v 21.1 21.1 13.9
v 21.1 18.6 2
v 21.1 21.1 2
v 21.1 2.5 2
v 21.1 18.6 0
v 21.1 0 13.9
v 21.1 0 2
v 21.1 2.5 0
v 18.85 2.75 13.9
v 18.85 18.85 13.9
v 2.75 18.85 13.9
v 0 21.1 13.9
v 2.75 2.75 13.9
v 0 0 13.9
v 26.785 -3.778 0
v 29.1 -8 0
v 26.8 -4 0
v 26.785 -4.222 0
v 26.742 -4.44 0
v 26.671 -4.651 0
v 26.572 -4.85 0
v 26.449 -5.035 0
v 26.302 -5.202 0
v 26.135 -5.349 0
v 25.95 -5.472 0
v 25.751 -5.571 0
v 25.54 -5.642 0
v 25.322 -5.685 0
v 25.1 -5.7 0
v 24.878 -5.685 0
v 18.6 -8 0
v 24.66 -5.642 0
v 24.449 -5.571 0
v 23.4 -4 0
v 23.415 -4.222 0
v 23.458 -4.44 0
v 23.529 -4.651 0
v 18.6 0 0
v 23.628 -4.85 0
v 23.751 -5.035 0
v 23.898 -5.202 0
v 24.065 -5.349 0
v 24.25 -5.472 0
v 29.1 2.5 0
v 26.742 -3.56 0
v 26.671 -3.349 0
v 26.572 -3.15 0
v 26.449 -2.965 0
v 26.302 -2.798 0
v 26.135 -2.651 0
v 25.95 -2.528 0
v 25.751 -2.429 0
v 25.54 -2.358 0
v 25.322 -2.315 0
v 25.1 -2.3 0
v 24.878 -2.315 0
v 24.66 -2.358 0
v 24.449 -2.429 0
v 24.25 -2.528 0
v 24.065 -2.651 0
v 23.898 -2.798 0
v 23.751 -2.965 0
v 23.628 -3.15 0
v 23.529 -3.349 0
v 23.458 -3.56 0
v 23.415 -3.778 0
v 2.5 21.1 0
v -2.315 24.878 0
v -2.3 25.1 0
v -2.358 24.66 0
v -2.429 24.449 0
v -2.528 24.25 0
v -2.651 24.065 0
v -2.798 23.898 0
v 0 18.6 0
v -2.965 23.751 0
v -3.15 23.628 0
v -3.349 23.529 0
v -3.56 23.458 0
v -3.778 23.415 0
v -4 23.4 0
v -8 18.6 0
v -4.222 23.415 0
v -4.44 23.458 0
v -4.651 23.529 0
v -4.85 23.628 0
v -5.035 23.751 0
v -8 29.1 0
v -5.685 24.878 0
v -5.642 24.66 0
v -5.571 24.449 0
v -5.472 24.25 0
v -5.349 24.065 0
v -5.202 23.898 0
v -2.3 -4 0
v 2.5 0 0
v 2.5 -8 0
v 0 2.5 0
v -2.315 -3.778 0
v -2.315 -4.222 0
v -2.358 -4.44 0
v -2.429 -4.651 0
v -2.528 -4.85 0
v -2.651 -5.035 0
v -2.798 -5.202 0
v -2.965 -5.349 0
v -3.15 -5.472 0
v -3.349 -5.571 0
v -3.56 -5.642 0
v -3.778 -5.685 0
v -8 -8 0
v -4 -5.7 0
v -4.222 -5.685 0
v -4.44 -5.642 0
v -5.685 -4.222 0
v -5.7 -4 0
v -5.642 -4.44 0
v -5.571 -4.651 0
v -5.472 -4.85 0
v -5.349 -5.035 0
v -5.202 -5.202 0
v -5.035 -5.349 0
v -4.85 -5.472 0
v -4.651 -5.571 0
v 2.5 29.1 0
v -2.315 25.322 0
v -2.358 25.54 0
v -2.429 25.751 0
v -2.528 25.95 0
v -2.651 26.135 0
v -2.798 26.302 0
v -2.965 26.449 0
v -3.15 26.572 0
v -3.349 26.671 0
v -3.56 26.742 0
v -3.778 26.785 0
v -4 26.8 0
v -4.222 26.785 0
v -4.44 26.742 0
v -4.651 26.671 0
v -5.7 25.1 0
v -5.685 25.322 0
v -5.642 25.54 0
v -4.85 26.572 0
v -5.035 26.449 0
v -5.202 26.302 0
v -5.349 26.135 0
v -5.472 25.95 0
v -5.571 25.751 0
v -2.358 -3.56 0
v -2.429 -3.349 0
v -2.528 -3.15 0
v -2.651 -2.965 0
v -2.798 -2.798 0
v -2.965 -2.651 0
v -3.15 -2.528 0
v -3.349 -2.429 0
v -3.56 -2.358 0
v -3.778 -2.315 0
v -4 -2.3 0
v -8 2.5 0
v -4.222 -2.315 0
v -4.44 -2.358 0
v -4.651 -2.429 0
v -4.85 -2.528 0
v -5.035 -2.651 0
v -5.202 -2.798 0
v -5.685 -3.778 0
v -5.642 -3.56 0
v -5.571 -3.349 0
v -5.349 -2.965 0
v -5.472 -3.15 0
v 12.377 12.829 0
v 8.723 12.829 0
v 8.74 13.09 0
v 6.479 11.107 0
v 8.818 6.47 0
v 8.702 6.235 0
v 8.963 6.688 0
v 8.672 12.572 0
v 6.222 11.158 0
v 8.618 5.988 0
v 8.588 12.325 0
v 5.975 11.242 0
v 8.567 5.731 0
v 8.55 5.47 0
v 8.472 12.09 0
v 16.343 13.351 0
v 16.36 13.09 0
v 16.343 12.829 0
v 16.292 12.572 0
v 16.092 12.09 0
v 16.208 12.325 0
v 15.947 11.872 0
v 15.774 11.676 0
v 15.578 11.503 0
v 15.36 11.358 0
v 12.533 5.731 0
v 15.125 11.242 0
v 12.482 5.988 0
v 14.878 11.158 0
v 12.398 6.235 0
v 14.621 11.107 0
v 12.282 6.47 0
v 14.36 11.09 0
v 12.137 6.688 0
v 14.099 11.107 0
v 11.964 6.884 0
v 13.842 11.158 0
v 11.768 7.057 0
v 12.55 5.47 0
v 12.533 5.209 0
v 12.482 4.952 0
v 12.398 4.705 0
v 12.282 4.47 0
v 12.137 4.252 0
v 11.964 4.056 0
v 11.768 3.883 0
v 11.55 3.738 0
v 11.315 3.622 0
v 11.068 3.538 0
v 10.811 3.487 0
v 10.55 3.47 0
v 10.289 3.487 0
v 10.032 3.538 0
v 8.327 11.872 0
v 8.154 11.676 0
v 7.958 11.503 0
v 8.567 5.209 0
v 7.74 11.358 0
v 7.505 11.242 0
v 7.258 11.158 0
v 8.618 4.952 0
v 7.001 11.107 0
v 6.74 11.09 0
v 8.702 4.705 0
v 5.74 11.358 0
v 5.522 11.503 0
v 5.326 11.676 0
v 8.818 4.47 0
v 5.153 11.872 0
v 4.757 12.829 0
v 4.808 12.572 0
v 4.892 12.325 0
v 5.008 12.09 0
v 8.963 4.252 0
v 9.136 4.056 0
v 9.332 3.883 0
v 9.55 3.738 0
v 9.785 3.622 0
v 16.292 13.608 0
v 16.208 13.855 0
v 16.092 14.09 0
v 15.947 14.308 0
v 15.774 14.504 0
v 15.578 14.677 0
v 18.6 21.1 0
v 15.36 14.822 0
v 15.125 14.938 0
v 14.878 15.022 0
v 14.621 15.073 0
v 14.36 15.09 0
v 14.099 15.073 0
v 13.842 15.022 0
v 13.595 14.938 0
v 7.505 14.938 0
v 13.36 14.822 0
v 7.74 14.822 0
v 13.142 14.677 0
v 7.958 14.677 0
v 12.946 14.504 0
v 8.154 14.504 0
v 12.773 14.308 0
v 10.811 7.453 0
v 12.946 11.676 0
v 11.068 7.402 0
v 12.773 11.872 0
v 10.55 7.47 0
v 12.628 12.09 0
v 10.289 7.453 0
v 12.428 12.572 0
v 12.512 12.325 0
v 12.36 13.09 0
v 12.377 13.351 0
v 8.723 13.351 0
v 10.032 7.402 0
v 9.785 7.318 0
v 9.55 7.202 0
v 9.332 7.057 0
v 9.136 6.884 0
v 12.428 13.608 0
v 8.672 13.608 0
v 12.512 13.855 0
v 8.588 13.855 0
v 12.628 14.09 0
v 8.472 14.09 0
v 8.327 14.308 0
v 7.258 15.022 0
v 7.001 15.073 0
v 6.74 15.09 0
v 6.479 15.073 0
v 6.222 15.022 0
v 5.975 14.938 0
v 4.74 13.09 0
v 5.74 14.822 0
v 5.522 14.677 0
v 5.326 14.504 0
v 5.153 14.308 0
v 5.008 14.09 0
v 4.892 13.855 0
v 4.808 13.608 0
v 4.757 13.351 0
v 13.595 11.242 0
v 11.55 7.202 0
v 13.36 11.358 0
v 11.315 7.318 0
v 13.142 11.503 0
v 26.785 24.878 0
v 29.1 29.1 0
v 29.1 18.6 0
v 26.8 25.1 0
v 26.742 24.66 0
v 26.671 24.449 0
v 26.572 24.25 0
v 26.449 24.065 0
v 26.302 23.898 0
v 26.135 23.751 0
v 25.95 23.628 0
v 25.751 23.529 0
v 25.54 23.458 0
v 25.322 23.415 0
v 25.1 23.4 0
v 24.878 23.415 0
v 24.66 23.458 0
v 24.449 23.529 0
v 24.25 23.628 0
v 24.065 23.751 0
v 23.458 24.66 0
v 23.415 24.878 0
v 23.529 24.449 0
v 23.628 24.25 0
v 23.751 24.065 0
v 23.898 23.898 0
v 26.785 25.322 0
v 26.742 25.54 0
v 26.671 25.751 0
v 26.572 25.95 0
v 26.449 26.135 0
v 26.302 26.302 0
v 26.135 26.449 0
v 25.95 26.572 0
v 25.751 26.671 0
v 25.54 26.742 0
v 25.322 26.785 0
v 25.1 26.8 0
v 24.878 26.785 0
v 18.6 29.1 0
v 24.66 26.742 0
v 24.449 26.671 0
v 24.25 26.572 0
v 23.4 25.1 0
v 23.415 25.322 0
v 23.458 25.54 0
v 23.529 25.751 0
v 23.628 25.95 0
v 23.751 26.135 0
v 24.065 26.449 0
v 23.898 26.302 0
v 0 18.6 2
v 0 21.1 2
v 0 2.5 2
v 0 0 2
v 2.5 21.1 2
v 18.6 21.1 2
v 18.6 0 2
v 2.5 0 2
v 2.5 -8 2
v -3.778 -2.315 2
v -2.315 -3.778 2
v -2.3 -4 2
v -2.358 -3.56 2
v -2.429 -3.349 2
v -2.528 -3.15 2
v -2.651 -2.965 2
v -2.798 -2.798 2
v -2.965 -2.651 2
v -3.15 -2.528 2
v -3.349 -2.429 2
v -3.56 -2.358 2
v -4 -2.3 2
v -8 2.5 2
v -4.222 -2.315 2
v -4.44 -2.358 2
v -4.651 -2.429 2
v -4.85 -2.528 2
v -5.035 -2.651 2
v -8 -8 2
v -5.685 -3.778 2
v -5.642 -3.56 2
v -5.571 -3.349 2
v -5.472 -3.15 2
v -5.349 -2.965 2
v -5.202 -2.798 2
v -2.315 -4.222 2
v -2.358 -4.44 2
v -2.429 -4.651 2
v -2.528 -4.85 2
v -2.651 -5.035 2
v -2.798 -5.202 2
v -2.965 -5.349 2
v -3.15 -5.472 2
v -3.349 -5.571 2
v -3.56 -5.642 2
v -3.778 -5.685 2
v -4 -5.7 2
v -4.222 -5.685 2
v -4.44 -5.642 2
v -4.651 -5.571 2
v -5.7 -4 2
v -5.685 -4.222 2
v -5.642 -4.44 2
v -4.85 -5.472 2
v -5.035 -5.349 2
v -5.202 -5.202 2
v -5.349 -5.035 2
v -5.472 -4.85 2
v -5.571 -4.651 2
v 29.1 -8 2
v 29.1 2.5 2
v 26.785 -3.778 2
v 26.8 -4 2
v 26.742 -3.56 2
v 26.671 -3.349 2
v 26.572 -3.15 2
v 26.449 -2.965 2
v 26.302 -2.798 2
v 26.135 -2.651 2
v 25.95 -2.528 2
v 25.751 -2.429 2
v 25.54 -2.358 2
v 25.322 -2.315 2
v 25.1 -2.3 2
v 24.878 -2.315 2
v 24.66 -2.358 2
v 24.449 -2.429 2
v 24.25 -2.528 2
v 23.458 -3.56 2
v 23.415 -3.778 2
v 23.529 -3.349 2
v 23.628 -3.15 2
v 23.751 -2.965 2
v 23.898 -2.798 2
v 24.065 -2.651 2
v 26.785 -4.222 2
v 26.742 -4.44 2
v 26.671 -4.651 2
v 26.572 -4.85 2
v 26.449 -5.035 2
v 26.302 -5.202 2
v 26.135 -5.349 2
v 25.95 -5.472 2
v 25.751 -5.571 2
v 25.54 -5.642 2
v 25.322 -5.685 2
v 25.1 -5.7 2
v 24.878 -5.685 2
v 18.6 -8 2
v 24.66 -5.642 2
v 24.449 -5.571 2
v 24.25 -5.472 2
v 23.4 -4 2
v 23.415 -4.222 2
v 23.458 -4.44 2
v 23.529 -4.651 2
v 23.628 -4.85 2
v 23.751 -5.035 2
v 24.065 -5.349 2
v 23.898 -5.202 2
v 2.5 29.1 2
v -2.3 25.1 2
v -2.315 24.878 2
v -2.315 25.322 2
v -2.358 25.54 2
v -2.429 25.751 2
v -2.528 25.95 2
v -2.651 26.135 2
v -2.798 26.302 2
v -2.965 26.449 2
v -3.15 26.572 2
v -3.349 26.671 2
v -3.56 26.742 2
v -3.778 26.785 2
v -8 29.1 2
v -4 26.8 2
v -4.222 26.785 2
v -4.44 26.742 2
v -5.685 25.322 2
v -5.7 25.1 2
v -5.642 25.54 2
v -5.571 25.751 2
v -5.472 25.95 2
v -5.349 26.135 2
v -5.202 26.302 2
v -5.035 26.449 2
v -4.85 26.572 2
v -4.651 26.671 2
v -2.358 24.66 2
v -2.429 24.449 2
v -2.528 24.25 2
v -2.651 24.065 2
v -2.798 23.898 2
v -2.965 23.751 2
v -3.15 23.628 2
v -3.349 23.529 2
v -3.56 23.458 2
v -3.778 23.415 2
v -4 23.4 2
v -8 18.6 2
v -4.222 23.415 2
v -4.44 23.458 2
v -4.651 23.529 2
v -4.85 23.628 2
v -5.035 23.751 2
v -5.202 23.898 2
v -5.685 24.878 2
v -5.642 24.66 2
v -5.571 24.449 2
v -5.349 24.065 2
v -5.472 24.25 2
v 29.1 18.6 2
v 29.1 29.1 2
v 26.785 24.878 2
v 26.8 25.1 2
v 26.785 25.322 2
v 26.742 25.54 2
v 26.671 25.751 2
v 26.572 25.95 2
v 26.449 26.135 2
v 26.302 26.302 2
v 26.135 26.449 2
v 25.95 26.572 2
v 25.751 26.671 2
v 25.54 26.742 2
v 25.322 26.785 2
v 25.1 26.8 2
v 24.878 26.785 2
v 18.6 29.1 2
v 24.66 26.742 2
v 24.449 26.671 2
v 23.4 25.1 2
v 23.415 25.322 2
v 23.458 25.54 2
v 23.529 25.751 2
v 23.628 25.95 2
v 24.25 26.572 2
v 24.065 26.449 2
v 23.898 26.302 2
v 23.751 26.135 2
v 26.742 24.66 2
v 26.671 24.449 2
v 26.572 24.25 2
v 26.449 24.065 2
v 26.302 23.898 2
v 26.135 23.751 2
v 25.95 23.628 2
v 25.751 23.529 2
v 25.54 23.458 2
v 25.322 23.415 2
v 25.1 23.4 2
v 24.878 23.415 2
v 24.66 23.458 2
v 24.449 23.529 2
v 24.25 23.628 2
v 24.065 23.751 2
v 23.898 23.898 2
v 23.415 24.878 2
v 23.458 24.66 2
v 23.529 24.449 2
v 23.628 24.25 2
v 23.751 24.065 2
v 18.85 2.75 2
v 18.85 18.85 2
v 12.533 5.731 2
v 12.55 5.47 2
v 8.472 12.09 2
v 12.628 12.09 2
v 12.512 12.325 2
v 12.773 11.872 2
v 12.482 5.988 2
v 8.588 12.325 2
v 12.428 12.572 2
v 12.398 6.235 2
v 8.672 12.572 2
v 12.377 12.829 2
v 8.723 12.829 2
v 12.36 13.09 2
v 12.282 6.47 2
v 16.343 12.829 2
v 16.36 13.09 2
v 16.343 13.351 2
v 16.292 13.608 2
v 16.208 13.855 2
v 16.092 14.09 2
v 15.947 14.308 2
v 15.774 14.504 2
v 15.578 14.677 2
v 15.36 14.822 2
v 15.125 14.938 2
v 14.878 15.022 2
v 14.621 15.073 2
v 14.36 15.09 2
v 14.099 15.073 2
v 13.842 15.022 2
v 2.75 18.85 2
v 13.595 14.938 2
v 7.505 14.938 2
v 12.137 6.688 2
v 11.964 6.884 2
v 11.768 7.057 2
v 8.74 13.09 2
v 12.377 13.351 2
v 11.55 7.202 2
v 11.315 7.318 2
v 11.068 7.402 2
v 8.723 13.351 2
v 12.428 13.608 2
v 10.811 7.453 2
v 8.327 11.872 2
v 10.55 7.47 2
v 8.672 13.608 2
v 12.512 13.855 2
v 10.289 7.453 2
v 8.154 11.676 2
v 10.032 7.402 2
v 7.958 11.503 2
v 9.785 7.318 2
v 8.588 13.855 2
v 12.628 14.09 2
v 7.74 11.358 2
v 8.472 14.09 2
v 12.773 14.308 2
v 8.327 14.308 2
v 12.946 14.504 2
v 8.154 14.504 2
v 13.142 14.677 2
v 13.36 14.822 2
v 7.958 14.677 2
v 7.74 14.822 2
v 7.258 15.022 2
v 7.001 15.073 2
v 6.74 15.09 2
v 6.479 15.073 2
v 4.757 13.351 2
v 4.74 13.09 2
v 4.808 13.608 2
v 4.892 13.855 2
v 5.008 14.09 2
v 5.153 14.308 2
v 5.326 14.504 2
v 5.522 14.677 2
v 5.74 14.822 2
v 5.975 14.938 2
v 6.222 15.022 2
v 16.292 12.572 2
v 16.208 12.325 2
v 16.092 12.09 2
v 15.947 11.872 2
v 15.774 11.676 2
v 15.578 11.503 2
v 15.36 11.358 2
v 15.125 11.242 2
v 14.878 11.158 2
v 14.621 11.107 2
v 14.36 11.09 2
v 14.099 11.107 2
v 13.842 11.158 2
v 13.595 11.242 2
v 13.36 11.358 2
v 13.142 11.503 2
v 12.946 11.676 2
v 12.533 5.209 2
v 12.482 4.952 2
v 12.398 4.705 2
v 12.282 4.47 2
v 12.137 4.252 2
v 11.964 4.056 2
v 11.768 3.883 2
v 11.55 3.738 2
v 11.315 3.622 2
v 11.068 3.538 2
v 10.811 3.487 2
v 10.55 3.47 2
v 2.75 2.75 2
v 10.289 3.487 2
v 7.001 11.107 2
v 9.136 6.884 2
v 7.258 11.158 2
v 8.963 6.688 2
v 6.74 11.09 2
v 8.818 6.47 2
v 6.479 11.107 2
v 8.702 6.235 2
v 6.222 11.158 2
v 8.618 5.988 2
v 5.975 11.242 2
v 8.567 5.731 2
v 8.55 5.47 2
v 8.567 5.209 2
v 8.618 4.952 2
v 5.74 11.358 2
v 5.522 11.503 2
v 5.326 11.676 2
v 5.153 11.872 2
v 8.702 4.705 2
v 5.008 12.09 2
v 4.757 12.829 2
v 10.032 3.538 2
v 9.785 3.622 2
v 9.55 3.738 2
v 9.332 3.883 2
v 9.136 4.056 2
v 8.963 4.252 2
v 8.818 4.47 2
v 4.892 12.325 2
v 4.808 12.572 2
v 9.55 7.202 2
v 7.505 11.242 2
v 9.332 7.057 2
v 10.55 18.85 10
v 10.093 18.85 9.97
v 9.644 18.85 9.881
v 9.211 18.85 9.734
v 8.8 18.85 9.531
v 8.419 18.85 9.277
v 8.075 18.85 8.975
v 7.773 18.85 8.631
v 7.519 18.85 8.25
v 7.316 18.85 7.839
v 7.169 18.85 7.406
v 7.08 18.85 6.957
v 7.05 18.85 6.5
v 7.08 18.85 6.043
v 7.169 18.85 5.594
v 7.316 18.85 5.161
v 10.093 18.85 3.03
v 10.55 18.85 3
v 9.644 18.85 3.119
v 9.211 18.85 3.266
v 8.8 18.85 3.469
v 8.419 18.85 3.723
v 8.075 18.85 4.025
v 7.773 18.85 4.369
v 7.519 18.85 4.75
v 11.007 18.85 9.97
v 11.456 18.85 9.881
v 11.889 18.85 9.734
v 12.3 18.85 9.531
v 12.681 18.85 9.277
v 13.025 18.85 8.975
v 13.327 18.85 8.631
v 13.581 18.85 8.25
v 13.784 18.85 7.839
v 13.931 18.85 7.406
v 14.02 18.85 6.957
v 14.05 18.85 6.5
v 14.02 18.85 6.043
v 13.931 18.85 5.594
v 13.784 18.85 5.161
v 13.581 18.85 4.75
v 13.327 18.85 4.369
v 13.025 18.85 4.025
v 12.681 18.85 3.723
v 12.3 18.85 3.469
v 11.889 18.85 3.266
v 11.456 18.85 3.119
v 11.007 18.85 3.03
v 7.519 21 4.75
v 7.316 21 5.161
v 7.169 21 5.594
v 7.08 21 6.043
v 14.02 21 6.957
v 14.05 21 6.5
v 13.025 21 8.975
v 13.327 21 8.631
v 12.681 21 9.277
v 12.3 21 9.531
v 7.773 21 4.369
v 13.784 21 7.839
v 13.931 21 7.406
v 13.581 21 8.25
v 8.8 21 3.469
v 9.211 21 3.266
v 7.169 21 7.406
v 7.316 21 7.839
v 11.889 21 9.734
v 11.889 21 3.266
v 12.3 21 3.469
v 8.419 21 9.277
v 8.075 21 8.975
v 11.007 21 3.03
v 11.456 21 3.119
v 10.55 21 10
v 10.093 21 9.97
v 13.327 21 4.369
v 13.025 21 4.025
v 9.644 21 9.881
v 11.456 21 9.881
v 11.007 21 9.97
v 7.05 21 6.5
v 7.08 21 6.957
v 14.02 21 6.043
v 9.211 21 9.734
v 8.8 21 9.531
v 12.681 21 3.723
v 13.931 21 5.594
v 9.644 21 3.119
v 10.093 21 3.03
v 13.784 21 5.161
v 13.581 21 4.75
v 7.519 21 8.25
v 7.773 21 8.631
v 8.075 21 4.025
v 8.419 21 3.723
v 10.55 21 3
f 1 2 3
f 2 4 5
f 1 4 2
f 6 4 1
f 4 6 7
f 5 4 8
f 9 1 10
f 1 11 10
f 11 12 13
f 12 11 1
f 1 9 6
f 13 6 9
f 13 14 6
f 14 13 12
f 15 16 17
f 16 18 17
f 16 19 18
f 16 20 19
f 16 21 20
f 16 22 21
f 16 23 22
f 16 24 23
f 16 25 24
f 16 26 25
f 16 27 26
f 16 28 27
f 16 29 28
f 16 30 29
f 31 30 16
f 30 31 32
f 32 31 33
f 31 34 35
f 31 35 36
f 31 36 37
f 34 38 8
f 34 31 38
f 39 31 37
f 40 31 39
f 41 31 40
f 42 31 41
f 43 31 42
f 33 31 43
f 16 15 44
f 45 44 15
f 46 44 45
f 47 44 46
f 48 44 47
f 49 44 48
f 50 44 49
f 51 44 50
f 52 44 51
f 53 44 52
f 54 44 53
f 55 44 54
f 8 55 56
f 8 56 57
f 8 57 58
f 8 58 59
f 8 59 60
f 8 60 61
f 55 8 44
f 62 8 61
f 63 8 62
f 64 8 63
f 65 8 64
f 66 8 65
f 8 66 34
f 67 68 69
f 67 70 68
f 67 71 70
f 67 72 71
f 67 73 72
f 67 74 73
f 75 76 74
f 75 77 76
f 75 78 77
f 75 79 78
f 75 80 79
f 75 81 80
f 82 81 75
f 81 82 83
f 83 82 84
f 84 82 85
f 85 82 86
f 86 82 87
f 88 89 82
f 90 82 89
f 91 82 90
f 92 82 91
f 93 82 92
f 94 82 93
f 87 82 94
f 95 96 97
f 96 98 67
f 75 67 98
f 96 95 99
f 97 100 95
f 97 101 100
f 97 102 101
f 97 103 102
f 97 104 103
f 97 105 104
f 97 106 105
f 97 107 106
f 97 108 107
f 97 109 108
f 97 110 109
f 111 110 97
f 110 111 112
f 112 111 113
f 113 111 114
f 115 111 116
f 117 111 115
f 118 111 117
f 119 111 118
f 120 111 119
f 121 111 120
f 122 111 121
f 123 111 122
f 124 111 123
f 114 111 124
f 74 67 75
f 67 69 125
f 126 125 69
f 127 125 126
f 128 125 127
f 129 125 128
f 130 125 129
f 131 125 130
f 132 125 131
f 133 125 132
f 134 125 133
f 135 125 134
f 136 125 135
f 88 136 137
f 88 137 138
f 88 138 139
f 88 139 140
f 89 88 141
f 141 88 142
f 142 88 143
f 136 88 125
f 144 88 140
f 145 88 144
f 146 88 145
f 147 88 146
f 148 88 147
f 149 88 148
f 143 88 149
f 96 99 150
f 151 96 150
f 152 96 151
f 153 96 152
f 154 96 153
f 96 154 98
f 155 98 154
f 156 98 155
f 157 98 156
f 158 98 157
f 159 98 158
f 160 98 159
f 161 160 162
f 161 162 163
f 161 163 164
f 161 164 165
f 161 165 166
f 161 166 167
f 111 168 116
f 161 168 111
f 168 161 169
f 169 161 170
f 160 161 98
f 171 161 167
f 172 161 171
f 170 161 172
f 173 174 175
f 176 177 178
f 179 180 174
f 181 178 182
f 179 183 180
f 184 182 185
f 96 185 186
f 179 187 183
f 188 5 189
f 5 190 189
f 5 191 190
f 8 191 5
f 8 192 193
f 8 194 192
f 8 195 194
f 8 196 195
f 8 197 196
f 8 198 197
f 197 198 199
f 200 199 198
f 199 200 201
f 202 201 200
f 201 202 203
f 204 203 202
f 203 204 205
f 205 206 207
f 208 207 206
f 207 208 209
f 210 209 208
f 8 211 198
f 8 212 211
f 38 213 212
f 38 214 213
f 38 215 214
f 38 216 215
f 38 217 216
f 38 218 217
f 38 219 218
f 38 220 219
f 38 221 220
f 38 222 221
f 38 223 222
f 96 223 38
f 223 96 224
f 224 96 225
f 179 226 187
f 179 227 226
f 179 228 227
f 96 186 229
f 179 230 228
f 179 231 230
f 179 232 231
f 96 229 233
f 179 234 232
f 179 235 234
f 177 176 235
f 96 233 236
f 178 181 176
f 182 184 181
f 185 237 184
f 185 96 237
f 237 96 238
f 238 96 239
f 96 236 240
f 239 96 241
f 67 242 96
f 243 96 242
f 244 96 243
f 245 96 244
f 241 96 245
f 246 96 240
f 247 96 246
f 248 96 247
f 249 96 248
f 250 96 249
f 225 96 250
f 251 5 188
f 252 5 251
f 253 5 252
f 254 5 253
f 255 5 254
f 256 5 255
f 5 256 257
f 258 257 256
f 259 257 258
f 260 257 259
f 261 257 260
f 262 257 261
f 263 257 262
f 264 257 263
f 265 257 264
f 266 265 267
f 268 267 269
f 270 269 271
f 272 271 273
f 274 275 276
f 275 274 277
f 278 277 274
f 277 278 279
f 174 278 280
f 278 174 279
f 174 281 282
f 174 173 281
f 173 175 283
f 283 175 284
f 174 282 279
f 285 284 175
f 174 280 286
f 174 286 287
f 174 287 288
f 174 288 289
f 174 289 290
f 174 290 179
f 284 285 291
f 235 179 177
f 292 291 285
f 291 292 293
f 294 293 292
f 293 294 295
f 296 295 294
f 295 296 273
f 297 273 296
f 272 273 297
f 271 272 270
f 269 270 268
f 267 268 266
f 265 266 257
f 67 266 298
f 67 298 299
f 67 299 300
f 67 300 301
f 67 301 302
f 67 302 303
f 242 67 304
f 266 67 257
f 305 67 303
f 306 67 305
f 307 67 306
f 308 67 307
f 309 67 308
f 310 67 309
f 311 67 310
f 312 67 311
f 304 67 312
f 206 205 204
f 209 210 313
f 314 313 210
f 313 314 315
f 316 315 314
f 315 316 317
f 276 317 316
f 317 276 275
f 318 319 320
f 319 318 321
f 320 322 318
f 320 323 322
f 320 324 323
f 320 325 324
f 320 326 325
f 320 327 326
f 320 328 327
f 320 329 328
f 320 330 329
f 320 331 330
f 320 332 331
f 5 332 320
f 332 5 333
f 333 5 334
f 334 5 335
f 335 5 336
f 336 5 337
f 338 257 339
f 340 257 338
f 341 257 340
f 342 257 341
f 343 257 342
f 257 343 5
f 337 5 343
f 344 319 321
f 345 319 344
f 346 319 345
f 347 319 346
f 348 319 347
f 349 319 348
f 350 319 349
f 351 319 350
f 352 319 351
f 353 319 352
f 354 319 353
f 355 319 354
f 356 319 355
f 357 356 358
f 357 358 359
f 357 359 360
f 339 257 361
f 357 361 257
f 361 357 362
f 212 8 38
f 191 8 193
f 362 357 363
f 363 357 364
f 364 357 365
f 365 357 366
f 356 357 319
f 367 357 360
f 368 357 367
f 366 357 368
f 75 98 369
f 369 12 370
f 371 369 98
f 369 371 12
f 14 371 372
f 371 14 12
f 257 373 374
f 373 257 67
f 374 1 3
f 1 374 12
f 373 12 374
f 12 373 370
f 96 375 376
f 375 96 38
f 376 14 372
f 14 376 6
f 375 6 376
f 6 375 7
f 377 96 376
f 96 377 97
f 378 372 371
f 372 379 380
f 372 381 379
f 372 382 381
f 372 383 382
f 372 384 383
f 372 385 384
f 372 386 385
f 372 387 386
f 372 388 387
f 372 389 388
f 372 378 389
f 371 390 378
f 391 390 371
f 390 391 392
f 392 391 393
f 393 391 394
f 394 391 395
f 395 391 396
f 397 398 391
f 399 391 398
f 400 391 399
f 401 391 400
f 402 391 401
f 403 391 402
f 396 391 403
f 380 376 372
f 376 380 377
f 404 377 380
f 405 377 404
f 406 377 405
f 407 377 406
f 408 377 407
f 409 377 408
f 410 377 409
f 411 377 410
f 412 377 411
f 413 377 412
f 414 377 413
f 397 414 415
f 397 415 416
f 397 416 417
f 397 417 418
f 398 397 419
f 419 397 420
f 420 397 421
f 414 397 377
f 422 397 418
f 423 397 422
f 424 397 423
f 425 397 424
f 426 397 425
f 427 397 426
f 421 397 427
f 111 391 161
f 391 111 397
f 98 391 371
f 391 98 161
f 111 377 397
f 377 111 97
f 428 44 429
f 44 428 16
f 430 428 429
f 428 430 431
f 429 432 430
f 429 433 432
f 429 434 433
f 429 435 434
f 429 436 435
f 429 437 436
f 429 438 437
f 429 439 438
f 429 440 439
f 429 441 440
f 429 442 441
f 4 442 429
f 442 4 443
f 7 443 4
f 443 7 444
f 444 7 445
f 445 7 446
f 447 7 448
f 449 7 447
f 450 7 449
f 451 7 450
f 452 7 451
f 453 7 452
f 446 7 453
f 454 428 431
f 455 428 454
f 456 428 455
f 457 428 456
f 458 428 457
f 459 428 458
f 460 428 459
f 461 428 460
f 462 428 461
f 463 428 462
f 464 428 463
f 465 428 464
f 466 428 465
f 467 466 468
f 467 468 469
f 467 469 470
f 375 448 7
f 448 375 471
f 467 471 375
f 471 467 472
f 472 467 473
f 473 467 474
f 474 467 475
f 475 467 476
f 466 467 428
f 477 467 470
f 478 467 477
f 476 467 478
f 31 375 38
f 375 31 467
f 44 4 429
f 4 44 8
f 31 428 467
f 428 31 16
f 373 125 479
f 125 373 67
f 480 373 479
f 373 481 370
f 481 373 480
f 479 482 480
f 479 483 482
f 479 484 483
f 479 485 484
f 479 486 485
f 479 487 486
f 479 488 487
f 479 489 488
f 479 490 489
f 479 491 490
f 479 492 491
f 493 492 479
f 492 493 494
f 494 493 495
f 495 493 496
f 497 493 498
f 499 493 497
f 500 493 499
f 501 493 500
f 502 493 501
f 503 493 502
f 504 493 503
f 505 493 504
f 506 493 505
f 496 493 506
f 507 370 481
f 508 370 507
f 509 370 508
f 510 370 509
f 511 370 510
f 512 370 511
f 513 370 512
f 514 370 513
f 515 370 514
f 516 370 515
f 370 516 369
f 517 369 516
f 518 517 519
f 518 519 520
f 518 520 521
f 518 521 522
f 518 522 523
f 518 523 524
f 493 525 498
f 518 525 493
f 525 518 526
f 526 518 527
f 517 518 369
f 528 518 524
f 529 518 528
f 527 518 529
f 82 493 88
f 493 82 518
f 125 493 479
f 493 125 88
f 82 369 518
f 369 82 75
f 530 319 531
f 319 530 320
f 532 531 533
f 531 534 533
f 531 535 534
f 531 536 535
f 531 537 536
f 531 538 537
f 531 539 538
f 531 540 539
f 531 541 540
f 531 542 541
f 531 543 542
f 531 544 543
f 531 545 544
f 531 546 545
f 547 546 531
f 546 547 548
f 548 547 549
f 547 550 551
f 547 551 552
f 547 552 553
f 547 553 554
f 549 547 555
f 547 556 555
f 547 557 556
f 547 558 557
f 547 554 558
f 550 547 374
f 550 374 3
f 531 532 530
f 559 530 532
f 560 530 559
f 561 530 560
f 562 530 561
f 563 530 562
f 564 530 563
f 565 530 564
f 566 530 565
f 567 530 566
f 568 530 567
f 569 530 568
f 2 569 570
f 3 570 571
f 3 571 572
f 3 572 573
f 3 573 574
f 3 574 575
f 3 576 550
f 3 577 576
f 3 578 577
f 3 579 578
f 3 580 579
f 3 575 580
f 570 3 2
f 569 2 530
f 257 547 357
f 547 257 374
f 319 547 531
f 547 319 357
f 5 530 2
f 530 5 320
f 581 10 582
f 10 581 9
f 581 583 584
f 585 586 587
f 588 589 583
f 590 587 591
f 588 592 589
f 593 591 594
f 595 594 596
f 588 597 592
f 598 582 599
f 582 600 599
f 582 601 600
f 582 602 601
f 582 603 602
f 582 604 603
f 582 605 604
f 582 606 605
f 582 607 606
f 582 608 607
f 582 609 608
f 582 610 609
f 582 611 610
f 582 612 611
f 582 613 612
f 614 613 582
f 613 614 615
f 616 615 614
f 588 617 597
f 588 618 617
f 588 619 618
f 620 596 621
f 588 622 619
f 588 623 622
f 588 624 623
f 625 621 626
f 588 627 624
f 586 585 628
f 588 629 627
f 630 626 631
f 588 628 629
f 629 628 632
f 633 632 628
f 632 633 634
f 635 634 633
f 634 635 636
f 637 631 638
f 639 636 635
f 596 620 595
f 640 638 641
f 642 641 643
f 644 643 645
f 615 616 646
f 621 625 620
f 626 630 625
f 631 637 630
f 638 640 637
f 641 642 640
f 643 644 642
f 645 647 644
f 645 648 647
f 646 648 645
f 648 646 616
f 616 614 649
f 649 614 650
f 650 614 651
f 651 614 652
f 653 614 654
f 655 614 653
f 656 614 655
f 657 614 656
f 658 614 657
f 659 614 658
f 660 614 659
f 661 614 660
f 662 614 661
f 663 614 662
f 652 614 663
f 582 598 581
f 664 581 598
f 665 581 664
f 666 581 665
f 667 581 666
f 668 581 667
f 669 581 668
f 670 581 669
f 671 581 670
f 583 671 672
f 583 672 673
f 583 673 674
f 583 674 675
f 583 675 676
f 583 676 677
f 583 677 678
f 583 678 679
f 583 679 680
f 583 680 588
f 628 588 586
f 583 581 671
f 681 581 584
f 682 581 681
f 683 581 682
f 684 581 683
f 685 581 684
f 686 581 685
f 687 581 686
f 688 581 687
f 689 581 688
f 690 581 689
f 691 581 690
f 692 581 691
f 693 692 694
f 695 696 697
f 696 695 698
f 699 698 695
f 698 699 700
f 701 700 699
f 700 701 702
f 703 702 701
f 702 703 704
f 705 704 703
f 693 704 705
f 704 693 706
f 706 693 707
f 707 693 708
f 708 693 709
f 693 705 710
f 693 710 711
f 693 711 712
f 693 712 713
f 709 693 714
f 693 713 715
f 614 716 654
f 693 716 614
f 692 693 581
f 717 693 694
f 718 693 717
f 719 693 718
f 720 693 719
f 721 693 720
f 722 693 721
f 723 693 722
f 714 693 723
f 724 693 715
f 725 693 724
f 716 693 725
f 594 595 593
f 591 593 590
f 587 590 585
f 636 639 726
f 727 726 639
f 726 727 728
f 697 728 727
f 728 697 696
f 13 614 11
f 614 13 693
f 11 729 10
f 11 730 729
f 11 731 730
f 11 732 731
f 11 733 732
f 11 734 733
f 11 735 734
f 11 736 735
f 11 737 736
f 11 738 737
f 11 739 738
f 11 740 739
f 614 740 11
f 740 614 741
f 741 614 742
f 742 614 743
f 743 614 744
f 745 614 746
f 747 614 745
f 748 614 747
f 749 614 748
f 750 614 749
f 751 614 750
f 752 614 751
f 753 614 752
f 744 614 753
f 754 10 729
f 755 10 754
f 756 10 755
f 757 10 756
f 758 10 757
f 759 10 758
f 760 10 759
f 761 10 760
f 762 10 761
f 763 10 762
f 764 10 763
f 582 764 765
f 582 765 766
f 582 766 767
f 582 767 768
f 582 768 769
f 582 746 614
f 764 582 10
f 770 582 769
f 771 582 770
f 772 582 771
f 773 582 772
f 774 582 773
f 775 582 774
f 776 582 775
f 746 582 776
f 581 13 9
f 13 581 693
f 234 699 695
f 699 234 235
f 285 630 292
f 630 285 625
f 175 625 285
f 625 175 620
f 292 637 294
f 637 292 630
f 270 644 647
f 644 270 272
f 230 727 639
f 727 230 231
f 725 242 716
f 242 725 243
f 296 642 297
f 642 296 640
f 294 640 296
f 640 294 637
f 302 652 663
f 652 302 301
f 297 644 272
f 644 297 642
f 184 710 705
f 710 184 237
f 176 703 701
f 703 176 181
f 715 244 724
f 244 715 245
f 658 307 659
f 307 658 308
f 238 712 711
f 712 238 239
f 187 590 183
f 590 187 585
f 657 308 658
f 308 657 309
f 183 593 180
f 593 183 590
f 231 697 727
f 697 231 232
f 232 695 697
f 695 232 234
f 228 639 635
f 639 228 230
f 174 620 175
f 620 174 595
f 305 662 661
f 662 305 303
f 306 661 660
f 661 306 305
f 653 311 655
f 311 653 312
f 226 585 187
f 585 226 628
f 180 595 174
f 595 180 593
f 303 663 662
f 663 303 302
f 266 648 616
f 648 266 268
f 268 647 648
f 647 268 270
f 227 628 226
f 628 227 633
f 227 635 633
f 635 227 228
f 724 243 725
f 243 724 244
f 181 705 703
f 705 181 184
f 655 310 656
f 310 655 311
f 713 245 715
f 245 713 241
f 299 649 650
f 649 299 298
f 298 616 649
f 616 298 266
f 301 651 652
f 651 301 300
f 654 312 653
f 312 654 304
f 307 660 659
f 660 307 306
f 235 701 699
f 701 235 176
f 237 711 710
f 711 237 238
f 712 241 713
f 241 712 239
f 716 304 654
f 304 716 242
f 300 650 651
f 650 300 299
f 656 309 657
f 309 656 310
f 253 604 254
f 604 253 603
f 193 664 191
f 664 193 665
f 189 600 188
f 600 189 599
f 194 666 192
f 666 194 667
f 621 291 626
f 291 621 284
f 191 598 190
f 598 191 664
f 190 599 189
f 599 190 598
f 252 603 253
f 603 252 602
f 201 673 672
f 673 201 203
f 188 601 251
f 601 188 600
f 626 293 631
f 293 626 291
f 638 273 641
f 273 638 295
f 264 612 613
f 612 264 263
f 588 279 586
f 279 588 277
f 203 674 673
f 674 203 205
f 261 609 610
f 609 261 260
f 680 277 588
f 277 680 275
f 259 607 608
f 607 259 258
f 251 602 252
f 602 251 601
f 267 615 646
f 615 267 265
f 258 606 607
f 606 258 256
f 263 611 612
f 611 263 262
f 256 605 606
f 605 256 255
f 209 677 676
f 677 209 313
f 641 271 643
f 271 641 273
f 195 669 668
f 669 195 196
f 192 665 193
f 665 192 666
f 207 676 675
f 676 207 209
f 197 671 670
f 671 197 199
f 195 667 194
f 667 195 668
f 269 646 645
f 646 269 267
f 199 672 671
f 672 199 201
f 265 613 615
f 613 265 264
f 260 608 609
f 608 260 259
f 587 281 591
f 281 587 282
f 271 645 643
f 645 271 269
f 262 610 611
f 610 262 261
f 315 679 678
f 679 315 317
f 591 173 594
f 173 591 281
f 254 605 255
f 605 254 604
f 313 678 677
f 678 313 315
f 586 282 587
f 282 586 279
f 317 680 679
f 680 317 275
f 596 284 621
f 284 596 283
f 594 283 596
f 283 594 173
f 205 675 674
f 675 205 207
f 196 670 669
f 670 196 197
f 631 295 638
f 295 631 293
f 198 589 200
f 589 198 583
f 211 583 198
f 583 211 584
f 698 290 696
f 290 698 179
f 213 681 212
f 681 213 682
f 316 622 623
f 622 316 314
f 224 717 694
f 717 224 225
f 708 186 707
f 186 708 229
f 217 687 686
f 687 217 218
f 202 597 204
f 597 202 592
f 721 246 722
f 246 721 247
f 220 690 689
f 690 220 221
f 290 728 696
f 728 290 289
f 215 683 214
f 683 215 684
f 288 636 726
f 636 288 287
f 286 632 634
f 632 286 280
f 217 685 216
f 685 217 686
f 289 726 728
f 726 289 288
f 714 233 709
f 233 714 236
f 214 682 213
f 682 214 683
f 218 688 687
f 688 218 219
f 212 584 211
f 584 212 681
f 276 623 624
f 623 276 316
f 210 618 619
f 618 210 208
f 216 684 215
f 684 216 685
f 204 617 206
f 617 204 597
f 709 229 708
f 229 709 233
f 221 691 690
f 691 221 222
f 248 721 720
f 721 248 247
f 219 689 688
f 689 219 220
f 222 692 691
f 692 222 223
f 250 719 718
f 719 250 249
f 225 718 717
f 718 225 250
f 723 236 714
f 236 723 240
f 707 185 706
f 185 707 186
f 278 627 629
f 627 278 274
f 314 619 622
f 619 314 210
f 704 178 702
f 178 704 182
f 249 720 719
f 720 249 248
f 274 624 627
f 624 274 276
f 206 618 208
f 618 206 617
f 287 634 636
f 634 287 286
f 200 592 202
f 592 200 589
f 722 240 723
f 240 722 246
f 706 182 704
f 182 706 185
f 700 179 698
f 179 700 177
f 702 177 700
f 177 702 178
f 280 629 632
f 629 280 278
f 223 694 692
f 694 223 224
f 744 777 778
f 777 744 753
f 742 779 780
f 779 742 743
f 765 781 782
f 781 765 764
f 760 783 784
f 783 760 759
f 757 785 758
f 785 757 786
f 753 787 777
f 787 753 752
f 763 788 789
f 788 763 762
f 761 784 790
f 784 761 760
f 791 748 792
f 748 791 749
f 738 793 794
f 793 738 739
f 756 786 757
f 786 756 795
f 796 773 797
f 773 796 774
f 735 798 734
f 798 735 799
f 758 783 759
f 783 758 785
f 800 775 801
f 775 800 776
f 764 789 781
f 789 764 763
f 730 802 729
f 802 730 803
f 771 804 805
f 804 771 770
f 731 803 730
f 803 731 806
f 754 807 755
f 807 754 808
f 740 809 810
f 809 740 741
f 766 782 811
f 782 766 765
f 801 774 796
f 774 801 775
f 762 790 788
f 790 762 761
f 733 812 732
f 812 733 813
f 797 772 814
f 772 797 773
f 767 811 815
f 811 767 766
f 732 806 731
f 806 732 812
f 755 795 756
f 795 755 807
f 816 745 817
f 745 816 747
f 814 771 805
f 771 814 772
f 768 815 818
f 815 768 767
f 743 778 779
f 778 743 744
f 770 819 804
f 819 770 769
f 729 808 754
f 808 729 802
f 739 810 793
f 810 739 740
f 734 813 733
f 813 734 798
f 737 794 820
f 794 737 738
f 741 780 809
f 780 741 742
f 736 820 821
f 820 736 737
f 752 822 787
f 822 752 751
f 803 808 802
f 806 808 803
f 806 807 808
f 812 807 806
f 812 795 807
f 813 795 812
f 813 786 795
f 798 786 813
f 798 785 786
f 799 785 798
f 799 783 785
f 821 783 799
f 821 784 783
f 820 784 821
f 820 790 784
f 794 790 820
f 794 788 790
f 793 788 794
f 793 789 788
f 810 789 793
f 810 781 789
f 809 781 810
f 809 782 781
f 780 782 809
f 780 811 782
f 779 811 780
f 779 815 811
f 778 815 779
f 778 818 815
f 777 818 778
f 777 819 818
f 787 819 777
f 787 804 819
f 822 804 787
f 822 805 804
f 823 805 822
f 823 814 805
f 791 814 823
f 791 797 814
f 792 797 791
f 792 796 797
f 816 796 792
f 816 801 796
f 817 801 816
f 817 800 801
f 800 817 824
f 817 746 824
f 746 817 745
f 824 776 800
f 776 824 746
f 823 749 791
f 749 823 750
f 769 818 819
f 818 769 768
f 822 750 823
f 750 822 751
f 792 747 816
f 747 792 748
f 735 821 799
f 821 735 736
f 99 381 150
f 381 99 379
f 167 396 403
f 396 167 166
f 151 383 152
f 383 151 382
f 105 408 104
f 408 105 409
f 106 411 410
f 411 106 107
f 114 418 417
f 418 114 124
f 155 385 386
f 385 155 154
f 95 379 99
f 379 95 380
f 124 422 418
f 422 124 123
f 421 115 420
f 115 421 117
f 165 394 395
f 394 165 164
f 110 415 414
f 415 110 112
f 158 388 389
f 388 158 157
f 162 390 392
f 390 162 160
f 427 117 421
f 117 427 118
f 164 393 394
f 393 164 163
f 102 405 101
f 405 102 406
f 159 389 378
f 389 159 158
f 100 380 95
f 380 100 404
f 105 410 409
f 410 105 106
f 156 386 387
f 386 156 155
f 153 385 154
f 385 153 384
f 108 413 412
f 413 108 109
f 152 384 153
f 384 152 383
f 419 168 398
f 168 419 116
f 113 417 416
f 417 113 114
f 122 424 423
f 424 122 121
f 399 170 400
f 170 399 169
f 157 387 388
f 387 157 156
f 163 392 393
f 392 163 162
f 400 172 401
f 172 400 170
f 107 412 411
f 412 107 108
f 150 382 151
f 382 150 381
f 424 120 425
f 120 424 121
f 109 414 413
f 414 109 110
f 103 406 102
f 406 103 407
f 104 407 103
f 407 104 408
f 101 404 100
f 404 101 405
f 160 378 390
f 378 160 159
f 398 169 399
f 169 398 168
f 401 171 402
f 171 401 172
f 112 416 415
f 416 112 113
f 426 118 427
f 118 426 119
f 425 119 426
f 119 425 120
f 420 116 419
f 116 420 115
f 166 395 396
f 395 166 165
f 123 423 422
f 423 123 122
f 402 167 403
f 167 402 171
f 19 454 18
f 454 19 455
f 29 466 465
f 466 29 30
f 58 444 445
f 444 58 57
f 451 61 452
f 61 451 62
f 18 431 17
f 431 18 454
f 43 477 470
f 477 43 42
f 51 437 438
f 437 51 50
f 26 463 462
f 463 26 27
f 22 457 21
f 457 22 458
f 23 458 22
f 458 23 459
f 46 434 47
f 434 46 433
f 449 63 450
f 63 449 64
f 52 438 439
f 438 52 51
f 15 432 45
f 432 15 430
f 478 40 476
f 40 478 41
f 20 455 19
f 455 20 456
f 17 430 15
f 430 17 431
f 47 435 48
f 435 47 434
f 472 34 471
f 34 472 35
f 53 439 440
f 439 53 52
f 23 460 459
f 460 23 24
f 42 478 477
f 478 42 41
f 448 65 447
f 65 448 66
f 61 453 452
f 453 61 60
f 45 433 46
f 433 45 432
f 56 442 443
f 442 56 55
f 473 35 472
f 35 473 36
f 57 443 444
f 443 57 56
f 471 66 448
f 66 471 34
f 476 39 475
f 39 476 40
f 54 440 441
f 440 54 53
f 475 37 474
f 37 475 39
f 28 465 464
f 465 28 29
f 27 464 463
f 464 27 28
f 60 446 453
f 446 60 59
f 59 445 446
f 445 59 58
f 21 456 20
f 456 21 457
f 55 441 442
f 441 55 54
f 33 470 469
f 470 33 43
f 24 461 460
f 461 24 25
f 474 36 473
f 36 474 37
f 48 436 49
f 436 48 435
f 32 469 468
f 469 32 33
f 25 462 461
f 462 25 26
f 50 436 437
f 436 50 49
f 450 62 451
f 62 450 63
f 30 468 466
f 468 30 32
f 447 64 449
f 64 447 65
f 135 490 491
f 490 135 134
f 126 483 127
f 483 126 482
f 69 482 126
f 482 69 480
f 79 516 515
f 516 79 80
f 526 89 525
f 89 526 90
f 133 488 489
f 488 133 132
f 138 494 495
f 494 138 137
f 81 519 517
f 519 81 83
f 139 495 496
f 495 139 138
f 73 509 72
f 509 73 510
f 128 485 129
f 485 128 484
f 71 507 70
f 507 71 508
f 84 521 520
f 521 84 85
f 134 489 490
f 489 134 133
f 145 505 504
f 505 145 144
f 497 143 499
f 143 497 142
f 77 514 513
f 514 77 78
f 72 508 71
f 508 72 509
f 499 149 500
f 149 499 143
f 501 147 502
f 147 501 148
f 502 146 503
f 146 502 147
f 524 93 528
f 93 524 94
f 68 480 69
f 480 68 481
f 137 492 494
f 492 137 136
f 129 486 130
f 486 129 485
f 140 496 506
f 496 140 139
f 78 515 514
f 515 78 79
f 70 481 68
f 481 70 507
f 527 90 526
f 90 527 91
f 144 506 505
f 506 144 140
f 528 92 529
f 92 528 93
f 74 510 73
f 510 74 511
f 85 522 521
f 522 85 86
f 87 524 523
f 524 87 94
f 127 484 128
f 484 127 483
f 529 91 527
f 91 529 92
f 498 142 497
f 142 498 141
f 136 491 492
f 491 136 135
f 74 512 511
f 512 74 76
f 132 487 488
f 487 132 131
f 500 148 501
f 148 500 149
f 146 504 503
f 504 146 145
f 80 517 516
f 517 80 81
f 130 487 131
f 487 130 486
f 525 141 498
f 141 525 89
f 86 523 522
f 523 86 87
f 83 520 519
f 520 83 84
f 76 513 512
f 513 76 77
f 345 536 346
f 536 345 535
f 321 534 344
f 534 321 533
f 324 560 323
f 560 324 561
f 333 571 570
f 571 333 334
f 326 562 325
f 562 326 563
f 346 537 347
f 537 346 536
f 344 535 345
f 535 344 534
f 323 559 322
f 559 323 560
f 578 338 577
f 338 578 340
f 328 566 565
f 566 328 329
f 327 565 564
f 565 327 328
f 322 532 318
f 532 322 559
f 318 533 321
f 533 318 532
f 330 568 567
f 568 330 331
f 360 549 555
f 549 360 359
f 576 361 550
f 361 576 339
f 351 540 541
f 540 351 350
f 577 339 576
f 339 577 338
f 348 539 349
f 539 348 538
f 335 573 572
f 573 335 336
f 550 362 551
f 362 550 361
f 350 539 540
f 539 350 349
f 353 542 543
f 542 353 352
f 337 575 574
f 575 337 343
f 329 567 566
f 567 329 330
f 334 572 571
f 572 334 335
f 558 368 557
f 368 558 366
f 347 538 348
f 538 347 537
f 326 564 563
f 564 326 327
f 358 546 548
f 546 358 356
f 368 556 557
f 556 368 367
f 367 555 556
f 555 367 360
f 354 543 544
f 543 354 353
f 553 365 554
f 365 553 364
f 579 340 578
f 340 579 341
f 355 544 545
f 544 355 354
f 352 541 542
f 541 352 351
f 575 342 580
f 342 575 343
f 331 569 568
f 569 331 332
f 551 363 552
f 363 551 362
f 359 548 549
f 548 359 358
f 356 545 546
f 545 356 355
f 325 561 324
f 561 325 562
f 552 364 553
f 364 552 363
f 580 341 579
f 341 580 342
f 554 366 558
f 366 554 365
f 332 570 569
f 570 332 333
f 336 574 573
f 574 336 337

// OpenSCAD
/* ================================================================
 * MX Switch Footswitch Mount — First Design Iteration
 * Designed for Akko V3 Fairy Linear Silent (MX-compatible)
 *
 * NOTE: This is the first design (bracket with mounting ears).
 * The final design used is switch_box.stl — regenerate it with
 * generate_stl.py.  This file is kept for reference / further
 * experimentation in OpenSCAD.
 *
 * PRINT SETTINGS
 *   Material  : PETG or ABS (PLA fine for light use)
 *   Layer     : 0.2 mm
 *   Infill    : 40 %+
 *   Supports  : not required
 *   Orientation: flat bottom face on the bed
 * ================================================================ */

$fn = 48;

SW_W        = 15.6;
SW_L        = 15.6;
SW_H        = 11.9;

PIN_X       = 3.81;
PIN_Y       = 2.54;
INCLUDE_PIN3 = true;
PIN3_Y      = 5.08;
PIN_SHAFT_D = 1.5;

TOL         = 0.25;
WALL        = 2.5;
FLOOR       = 2.0;
SOLDER_D    = 4.0;
CABLE_D     = 7.0;
EAR_W       = 8.0;
EAR_H       = FLOOR;
M3_D        = 3.4;

INNER_W     = SW_W + 2 * TOL;
INNER_L     = SW_L + 2 * TOL;
OUTER_W     = INNER_W + 2 * WALL;
OUTER_L     = INNER_L + 2 * WALL;
OUTER_H     = SW_H + FLOOR;

CX = OUTER_W / 2;
CY = OUTER_L / 2;

module cylinder_z(h, d) { cylinder(h = h, d = d, center = false); }

difference() {
    union() {
        cube([OUTER_W, OUTER_L, OUTER_H]);
        translate([-EAR_W, -EAR_W, 0])
            cube([EAR_W + WALL, EAR_W + WALL, EAR_H]);
        translate([OUTER_W - WALL, -EAR_W, 0])
            cube([EAR_W + WALL, EAR_W + WALL, EAR_H]);
        translate([-EAR_W, OUTER_L - WALL, 0])
            cube([EAR_W + WALL, EAR_W + WALL, EAR_H]);
        translate([OUTER_W - WALL, OUTER_L - WALL, 0])
            cube([EAR_W + WALL, EAR_W + WALL, EAR_H]);
    }
    translate([WALL + TOL, WALL + TOL, FLOOR])
        cube([INNER_W, INNER_L, SW_H + 1]);
    translate([CX - PIN_X, CY + PIN_Y, -0.1])
        cylinder_z(FLOOR + 0.2, SOLDER_D);
    translate([CX + PIN_X, CY + PIN_Y, -0.1])
        cylinder_z(FLOOR + 0.2, SOLDER_D);
    if (INCLUDE_PIN3) {
        translate([CX, CY - PIN3_Y, -0.1])
            cylinder_z(FLOOR + 0.2, SOLDER_D);
    }
    translate([CX, OUTER_L - 0.1, FLOOR + CABLE_D / 2 + 1])
        rotate([90, 0, 0])
            cylinder_z(WALL + 0.2, CABLE_D);
    ear_hole_z = EAR_H + 0.1;
    translate([-EAR_W / 2, -EAR_W / 2, -0.1])
        cylinder_z(ear_hole_z, M3_D);
    translate([OUTER_W + EAR_W / 2, -EAR_W / 2, -0.1])
        cylinder_z(ear_hole_z, M3_D);
    translate([-EAR_W / 2, OUTER_L + EAR_W / 2, -0.1])
        cylinder_z(ear_hole_z, M3_D);
    translate([OUTER_W + EAR_W / 2, OUTER_L + EAR_W / 2, -0.1])
        cylinder_z(ear_hole_z, M3_D);
}
